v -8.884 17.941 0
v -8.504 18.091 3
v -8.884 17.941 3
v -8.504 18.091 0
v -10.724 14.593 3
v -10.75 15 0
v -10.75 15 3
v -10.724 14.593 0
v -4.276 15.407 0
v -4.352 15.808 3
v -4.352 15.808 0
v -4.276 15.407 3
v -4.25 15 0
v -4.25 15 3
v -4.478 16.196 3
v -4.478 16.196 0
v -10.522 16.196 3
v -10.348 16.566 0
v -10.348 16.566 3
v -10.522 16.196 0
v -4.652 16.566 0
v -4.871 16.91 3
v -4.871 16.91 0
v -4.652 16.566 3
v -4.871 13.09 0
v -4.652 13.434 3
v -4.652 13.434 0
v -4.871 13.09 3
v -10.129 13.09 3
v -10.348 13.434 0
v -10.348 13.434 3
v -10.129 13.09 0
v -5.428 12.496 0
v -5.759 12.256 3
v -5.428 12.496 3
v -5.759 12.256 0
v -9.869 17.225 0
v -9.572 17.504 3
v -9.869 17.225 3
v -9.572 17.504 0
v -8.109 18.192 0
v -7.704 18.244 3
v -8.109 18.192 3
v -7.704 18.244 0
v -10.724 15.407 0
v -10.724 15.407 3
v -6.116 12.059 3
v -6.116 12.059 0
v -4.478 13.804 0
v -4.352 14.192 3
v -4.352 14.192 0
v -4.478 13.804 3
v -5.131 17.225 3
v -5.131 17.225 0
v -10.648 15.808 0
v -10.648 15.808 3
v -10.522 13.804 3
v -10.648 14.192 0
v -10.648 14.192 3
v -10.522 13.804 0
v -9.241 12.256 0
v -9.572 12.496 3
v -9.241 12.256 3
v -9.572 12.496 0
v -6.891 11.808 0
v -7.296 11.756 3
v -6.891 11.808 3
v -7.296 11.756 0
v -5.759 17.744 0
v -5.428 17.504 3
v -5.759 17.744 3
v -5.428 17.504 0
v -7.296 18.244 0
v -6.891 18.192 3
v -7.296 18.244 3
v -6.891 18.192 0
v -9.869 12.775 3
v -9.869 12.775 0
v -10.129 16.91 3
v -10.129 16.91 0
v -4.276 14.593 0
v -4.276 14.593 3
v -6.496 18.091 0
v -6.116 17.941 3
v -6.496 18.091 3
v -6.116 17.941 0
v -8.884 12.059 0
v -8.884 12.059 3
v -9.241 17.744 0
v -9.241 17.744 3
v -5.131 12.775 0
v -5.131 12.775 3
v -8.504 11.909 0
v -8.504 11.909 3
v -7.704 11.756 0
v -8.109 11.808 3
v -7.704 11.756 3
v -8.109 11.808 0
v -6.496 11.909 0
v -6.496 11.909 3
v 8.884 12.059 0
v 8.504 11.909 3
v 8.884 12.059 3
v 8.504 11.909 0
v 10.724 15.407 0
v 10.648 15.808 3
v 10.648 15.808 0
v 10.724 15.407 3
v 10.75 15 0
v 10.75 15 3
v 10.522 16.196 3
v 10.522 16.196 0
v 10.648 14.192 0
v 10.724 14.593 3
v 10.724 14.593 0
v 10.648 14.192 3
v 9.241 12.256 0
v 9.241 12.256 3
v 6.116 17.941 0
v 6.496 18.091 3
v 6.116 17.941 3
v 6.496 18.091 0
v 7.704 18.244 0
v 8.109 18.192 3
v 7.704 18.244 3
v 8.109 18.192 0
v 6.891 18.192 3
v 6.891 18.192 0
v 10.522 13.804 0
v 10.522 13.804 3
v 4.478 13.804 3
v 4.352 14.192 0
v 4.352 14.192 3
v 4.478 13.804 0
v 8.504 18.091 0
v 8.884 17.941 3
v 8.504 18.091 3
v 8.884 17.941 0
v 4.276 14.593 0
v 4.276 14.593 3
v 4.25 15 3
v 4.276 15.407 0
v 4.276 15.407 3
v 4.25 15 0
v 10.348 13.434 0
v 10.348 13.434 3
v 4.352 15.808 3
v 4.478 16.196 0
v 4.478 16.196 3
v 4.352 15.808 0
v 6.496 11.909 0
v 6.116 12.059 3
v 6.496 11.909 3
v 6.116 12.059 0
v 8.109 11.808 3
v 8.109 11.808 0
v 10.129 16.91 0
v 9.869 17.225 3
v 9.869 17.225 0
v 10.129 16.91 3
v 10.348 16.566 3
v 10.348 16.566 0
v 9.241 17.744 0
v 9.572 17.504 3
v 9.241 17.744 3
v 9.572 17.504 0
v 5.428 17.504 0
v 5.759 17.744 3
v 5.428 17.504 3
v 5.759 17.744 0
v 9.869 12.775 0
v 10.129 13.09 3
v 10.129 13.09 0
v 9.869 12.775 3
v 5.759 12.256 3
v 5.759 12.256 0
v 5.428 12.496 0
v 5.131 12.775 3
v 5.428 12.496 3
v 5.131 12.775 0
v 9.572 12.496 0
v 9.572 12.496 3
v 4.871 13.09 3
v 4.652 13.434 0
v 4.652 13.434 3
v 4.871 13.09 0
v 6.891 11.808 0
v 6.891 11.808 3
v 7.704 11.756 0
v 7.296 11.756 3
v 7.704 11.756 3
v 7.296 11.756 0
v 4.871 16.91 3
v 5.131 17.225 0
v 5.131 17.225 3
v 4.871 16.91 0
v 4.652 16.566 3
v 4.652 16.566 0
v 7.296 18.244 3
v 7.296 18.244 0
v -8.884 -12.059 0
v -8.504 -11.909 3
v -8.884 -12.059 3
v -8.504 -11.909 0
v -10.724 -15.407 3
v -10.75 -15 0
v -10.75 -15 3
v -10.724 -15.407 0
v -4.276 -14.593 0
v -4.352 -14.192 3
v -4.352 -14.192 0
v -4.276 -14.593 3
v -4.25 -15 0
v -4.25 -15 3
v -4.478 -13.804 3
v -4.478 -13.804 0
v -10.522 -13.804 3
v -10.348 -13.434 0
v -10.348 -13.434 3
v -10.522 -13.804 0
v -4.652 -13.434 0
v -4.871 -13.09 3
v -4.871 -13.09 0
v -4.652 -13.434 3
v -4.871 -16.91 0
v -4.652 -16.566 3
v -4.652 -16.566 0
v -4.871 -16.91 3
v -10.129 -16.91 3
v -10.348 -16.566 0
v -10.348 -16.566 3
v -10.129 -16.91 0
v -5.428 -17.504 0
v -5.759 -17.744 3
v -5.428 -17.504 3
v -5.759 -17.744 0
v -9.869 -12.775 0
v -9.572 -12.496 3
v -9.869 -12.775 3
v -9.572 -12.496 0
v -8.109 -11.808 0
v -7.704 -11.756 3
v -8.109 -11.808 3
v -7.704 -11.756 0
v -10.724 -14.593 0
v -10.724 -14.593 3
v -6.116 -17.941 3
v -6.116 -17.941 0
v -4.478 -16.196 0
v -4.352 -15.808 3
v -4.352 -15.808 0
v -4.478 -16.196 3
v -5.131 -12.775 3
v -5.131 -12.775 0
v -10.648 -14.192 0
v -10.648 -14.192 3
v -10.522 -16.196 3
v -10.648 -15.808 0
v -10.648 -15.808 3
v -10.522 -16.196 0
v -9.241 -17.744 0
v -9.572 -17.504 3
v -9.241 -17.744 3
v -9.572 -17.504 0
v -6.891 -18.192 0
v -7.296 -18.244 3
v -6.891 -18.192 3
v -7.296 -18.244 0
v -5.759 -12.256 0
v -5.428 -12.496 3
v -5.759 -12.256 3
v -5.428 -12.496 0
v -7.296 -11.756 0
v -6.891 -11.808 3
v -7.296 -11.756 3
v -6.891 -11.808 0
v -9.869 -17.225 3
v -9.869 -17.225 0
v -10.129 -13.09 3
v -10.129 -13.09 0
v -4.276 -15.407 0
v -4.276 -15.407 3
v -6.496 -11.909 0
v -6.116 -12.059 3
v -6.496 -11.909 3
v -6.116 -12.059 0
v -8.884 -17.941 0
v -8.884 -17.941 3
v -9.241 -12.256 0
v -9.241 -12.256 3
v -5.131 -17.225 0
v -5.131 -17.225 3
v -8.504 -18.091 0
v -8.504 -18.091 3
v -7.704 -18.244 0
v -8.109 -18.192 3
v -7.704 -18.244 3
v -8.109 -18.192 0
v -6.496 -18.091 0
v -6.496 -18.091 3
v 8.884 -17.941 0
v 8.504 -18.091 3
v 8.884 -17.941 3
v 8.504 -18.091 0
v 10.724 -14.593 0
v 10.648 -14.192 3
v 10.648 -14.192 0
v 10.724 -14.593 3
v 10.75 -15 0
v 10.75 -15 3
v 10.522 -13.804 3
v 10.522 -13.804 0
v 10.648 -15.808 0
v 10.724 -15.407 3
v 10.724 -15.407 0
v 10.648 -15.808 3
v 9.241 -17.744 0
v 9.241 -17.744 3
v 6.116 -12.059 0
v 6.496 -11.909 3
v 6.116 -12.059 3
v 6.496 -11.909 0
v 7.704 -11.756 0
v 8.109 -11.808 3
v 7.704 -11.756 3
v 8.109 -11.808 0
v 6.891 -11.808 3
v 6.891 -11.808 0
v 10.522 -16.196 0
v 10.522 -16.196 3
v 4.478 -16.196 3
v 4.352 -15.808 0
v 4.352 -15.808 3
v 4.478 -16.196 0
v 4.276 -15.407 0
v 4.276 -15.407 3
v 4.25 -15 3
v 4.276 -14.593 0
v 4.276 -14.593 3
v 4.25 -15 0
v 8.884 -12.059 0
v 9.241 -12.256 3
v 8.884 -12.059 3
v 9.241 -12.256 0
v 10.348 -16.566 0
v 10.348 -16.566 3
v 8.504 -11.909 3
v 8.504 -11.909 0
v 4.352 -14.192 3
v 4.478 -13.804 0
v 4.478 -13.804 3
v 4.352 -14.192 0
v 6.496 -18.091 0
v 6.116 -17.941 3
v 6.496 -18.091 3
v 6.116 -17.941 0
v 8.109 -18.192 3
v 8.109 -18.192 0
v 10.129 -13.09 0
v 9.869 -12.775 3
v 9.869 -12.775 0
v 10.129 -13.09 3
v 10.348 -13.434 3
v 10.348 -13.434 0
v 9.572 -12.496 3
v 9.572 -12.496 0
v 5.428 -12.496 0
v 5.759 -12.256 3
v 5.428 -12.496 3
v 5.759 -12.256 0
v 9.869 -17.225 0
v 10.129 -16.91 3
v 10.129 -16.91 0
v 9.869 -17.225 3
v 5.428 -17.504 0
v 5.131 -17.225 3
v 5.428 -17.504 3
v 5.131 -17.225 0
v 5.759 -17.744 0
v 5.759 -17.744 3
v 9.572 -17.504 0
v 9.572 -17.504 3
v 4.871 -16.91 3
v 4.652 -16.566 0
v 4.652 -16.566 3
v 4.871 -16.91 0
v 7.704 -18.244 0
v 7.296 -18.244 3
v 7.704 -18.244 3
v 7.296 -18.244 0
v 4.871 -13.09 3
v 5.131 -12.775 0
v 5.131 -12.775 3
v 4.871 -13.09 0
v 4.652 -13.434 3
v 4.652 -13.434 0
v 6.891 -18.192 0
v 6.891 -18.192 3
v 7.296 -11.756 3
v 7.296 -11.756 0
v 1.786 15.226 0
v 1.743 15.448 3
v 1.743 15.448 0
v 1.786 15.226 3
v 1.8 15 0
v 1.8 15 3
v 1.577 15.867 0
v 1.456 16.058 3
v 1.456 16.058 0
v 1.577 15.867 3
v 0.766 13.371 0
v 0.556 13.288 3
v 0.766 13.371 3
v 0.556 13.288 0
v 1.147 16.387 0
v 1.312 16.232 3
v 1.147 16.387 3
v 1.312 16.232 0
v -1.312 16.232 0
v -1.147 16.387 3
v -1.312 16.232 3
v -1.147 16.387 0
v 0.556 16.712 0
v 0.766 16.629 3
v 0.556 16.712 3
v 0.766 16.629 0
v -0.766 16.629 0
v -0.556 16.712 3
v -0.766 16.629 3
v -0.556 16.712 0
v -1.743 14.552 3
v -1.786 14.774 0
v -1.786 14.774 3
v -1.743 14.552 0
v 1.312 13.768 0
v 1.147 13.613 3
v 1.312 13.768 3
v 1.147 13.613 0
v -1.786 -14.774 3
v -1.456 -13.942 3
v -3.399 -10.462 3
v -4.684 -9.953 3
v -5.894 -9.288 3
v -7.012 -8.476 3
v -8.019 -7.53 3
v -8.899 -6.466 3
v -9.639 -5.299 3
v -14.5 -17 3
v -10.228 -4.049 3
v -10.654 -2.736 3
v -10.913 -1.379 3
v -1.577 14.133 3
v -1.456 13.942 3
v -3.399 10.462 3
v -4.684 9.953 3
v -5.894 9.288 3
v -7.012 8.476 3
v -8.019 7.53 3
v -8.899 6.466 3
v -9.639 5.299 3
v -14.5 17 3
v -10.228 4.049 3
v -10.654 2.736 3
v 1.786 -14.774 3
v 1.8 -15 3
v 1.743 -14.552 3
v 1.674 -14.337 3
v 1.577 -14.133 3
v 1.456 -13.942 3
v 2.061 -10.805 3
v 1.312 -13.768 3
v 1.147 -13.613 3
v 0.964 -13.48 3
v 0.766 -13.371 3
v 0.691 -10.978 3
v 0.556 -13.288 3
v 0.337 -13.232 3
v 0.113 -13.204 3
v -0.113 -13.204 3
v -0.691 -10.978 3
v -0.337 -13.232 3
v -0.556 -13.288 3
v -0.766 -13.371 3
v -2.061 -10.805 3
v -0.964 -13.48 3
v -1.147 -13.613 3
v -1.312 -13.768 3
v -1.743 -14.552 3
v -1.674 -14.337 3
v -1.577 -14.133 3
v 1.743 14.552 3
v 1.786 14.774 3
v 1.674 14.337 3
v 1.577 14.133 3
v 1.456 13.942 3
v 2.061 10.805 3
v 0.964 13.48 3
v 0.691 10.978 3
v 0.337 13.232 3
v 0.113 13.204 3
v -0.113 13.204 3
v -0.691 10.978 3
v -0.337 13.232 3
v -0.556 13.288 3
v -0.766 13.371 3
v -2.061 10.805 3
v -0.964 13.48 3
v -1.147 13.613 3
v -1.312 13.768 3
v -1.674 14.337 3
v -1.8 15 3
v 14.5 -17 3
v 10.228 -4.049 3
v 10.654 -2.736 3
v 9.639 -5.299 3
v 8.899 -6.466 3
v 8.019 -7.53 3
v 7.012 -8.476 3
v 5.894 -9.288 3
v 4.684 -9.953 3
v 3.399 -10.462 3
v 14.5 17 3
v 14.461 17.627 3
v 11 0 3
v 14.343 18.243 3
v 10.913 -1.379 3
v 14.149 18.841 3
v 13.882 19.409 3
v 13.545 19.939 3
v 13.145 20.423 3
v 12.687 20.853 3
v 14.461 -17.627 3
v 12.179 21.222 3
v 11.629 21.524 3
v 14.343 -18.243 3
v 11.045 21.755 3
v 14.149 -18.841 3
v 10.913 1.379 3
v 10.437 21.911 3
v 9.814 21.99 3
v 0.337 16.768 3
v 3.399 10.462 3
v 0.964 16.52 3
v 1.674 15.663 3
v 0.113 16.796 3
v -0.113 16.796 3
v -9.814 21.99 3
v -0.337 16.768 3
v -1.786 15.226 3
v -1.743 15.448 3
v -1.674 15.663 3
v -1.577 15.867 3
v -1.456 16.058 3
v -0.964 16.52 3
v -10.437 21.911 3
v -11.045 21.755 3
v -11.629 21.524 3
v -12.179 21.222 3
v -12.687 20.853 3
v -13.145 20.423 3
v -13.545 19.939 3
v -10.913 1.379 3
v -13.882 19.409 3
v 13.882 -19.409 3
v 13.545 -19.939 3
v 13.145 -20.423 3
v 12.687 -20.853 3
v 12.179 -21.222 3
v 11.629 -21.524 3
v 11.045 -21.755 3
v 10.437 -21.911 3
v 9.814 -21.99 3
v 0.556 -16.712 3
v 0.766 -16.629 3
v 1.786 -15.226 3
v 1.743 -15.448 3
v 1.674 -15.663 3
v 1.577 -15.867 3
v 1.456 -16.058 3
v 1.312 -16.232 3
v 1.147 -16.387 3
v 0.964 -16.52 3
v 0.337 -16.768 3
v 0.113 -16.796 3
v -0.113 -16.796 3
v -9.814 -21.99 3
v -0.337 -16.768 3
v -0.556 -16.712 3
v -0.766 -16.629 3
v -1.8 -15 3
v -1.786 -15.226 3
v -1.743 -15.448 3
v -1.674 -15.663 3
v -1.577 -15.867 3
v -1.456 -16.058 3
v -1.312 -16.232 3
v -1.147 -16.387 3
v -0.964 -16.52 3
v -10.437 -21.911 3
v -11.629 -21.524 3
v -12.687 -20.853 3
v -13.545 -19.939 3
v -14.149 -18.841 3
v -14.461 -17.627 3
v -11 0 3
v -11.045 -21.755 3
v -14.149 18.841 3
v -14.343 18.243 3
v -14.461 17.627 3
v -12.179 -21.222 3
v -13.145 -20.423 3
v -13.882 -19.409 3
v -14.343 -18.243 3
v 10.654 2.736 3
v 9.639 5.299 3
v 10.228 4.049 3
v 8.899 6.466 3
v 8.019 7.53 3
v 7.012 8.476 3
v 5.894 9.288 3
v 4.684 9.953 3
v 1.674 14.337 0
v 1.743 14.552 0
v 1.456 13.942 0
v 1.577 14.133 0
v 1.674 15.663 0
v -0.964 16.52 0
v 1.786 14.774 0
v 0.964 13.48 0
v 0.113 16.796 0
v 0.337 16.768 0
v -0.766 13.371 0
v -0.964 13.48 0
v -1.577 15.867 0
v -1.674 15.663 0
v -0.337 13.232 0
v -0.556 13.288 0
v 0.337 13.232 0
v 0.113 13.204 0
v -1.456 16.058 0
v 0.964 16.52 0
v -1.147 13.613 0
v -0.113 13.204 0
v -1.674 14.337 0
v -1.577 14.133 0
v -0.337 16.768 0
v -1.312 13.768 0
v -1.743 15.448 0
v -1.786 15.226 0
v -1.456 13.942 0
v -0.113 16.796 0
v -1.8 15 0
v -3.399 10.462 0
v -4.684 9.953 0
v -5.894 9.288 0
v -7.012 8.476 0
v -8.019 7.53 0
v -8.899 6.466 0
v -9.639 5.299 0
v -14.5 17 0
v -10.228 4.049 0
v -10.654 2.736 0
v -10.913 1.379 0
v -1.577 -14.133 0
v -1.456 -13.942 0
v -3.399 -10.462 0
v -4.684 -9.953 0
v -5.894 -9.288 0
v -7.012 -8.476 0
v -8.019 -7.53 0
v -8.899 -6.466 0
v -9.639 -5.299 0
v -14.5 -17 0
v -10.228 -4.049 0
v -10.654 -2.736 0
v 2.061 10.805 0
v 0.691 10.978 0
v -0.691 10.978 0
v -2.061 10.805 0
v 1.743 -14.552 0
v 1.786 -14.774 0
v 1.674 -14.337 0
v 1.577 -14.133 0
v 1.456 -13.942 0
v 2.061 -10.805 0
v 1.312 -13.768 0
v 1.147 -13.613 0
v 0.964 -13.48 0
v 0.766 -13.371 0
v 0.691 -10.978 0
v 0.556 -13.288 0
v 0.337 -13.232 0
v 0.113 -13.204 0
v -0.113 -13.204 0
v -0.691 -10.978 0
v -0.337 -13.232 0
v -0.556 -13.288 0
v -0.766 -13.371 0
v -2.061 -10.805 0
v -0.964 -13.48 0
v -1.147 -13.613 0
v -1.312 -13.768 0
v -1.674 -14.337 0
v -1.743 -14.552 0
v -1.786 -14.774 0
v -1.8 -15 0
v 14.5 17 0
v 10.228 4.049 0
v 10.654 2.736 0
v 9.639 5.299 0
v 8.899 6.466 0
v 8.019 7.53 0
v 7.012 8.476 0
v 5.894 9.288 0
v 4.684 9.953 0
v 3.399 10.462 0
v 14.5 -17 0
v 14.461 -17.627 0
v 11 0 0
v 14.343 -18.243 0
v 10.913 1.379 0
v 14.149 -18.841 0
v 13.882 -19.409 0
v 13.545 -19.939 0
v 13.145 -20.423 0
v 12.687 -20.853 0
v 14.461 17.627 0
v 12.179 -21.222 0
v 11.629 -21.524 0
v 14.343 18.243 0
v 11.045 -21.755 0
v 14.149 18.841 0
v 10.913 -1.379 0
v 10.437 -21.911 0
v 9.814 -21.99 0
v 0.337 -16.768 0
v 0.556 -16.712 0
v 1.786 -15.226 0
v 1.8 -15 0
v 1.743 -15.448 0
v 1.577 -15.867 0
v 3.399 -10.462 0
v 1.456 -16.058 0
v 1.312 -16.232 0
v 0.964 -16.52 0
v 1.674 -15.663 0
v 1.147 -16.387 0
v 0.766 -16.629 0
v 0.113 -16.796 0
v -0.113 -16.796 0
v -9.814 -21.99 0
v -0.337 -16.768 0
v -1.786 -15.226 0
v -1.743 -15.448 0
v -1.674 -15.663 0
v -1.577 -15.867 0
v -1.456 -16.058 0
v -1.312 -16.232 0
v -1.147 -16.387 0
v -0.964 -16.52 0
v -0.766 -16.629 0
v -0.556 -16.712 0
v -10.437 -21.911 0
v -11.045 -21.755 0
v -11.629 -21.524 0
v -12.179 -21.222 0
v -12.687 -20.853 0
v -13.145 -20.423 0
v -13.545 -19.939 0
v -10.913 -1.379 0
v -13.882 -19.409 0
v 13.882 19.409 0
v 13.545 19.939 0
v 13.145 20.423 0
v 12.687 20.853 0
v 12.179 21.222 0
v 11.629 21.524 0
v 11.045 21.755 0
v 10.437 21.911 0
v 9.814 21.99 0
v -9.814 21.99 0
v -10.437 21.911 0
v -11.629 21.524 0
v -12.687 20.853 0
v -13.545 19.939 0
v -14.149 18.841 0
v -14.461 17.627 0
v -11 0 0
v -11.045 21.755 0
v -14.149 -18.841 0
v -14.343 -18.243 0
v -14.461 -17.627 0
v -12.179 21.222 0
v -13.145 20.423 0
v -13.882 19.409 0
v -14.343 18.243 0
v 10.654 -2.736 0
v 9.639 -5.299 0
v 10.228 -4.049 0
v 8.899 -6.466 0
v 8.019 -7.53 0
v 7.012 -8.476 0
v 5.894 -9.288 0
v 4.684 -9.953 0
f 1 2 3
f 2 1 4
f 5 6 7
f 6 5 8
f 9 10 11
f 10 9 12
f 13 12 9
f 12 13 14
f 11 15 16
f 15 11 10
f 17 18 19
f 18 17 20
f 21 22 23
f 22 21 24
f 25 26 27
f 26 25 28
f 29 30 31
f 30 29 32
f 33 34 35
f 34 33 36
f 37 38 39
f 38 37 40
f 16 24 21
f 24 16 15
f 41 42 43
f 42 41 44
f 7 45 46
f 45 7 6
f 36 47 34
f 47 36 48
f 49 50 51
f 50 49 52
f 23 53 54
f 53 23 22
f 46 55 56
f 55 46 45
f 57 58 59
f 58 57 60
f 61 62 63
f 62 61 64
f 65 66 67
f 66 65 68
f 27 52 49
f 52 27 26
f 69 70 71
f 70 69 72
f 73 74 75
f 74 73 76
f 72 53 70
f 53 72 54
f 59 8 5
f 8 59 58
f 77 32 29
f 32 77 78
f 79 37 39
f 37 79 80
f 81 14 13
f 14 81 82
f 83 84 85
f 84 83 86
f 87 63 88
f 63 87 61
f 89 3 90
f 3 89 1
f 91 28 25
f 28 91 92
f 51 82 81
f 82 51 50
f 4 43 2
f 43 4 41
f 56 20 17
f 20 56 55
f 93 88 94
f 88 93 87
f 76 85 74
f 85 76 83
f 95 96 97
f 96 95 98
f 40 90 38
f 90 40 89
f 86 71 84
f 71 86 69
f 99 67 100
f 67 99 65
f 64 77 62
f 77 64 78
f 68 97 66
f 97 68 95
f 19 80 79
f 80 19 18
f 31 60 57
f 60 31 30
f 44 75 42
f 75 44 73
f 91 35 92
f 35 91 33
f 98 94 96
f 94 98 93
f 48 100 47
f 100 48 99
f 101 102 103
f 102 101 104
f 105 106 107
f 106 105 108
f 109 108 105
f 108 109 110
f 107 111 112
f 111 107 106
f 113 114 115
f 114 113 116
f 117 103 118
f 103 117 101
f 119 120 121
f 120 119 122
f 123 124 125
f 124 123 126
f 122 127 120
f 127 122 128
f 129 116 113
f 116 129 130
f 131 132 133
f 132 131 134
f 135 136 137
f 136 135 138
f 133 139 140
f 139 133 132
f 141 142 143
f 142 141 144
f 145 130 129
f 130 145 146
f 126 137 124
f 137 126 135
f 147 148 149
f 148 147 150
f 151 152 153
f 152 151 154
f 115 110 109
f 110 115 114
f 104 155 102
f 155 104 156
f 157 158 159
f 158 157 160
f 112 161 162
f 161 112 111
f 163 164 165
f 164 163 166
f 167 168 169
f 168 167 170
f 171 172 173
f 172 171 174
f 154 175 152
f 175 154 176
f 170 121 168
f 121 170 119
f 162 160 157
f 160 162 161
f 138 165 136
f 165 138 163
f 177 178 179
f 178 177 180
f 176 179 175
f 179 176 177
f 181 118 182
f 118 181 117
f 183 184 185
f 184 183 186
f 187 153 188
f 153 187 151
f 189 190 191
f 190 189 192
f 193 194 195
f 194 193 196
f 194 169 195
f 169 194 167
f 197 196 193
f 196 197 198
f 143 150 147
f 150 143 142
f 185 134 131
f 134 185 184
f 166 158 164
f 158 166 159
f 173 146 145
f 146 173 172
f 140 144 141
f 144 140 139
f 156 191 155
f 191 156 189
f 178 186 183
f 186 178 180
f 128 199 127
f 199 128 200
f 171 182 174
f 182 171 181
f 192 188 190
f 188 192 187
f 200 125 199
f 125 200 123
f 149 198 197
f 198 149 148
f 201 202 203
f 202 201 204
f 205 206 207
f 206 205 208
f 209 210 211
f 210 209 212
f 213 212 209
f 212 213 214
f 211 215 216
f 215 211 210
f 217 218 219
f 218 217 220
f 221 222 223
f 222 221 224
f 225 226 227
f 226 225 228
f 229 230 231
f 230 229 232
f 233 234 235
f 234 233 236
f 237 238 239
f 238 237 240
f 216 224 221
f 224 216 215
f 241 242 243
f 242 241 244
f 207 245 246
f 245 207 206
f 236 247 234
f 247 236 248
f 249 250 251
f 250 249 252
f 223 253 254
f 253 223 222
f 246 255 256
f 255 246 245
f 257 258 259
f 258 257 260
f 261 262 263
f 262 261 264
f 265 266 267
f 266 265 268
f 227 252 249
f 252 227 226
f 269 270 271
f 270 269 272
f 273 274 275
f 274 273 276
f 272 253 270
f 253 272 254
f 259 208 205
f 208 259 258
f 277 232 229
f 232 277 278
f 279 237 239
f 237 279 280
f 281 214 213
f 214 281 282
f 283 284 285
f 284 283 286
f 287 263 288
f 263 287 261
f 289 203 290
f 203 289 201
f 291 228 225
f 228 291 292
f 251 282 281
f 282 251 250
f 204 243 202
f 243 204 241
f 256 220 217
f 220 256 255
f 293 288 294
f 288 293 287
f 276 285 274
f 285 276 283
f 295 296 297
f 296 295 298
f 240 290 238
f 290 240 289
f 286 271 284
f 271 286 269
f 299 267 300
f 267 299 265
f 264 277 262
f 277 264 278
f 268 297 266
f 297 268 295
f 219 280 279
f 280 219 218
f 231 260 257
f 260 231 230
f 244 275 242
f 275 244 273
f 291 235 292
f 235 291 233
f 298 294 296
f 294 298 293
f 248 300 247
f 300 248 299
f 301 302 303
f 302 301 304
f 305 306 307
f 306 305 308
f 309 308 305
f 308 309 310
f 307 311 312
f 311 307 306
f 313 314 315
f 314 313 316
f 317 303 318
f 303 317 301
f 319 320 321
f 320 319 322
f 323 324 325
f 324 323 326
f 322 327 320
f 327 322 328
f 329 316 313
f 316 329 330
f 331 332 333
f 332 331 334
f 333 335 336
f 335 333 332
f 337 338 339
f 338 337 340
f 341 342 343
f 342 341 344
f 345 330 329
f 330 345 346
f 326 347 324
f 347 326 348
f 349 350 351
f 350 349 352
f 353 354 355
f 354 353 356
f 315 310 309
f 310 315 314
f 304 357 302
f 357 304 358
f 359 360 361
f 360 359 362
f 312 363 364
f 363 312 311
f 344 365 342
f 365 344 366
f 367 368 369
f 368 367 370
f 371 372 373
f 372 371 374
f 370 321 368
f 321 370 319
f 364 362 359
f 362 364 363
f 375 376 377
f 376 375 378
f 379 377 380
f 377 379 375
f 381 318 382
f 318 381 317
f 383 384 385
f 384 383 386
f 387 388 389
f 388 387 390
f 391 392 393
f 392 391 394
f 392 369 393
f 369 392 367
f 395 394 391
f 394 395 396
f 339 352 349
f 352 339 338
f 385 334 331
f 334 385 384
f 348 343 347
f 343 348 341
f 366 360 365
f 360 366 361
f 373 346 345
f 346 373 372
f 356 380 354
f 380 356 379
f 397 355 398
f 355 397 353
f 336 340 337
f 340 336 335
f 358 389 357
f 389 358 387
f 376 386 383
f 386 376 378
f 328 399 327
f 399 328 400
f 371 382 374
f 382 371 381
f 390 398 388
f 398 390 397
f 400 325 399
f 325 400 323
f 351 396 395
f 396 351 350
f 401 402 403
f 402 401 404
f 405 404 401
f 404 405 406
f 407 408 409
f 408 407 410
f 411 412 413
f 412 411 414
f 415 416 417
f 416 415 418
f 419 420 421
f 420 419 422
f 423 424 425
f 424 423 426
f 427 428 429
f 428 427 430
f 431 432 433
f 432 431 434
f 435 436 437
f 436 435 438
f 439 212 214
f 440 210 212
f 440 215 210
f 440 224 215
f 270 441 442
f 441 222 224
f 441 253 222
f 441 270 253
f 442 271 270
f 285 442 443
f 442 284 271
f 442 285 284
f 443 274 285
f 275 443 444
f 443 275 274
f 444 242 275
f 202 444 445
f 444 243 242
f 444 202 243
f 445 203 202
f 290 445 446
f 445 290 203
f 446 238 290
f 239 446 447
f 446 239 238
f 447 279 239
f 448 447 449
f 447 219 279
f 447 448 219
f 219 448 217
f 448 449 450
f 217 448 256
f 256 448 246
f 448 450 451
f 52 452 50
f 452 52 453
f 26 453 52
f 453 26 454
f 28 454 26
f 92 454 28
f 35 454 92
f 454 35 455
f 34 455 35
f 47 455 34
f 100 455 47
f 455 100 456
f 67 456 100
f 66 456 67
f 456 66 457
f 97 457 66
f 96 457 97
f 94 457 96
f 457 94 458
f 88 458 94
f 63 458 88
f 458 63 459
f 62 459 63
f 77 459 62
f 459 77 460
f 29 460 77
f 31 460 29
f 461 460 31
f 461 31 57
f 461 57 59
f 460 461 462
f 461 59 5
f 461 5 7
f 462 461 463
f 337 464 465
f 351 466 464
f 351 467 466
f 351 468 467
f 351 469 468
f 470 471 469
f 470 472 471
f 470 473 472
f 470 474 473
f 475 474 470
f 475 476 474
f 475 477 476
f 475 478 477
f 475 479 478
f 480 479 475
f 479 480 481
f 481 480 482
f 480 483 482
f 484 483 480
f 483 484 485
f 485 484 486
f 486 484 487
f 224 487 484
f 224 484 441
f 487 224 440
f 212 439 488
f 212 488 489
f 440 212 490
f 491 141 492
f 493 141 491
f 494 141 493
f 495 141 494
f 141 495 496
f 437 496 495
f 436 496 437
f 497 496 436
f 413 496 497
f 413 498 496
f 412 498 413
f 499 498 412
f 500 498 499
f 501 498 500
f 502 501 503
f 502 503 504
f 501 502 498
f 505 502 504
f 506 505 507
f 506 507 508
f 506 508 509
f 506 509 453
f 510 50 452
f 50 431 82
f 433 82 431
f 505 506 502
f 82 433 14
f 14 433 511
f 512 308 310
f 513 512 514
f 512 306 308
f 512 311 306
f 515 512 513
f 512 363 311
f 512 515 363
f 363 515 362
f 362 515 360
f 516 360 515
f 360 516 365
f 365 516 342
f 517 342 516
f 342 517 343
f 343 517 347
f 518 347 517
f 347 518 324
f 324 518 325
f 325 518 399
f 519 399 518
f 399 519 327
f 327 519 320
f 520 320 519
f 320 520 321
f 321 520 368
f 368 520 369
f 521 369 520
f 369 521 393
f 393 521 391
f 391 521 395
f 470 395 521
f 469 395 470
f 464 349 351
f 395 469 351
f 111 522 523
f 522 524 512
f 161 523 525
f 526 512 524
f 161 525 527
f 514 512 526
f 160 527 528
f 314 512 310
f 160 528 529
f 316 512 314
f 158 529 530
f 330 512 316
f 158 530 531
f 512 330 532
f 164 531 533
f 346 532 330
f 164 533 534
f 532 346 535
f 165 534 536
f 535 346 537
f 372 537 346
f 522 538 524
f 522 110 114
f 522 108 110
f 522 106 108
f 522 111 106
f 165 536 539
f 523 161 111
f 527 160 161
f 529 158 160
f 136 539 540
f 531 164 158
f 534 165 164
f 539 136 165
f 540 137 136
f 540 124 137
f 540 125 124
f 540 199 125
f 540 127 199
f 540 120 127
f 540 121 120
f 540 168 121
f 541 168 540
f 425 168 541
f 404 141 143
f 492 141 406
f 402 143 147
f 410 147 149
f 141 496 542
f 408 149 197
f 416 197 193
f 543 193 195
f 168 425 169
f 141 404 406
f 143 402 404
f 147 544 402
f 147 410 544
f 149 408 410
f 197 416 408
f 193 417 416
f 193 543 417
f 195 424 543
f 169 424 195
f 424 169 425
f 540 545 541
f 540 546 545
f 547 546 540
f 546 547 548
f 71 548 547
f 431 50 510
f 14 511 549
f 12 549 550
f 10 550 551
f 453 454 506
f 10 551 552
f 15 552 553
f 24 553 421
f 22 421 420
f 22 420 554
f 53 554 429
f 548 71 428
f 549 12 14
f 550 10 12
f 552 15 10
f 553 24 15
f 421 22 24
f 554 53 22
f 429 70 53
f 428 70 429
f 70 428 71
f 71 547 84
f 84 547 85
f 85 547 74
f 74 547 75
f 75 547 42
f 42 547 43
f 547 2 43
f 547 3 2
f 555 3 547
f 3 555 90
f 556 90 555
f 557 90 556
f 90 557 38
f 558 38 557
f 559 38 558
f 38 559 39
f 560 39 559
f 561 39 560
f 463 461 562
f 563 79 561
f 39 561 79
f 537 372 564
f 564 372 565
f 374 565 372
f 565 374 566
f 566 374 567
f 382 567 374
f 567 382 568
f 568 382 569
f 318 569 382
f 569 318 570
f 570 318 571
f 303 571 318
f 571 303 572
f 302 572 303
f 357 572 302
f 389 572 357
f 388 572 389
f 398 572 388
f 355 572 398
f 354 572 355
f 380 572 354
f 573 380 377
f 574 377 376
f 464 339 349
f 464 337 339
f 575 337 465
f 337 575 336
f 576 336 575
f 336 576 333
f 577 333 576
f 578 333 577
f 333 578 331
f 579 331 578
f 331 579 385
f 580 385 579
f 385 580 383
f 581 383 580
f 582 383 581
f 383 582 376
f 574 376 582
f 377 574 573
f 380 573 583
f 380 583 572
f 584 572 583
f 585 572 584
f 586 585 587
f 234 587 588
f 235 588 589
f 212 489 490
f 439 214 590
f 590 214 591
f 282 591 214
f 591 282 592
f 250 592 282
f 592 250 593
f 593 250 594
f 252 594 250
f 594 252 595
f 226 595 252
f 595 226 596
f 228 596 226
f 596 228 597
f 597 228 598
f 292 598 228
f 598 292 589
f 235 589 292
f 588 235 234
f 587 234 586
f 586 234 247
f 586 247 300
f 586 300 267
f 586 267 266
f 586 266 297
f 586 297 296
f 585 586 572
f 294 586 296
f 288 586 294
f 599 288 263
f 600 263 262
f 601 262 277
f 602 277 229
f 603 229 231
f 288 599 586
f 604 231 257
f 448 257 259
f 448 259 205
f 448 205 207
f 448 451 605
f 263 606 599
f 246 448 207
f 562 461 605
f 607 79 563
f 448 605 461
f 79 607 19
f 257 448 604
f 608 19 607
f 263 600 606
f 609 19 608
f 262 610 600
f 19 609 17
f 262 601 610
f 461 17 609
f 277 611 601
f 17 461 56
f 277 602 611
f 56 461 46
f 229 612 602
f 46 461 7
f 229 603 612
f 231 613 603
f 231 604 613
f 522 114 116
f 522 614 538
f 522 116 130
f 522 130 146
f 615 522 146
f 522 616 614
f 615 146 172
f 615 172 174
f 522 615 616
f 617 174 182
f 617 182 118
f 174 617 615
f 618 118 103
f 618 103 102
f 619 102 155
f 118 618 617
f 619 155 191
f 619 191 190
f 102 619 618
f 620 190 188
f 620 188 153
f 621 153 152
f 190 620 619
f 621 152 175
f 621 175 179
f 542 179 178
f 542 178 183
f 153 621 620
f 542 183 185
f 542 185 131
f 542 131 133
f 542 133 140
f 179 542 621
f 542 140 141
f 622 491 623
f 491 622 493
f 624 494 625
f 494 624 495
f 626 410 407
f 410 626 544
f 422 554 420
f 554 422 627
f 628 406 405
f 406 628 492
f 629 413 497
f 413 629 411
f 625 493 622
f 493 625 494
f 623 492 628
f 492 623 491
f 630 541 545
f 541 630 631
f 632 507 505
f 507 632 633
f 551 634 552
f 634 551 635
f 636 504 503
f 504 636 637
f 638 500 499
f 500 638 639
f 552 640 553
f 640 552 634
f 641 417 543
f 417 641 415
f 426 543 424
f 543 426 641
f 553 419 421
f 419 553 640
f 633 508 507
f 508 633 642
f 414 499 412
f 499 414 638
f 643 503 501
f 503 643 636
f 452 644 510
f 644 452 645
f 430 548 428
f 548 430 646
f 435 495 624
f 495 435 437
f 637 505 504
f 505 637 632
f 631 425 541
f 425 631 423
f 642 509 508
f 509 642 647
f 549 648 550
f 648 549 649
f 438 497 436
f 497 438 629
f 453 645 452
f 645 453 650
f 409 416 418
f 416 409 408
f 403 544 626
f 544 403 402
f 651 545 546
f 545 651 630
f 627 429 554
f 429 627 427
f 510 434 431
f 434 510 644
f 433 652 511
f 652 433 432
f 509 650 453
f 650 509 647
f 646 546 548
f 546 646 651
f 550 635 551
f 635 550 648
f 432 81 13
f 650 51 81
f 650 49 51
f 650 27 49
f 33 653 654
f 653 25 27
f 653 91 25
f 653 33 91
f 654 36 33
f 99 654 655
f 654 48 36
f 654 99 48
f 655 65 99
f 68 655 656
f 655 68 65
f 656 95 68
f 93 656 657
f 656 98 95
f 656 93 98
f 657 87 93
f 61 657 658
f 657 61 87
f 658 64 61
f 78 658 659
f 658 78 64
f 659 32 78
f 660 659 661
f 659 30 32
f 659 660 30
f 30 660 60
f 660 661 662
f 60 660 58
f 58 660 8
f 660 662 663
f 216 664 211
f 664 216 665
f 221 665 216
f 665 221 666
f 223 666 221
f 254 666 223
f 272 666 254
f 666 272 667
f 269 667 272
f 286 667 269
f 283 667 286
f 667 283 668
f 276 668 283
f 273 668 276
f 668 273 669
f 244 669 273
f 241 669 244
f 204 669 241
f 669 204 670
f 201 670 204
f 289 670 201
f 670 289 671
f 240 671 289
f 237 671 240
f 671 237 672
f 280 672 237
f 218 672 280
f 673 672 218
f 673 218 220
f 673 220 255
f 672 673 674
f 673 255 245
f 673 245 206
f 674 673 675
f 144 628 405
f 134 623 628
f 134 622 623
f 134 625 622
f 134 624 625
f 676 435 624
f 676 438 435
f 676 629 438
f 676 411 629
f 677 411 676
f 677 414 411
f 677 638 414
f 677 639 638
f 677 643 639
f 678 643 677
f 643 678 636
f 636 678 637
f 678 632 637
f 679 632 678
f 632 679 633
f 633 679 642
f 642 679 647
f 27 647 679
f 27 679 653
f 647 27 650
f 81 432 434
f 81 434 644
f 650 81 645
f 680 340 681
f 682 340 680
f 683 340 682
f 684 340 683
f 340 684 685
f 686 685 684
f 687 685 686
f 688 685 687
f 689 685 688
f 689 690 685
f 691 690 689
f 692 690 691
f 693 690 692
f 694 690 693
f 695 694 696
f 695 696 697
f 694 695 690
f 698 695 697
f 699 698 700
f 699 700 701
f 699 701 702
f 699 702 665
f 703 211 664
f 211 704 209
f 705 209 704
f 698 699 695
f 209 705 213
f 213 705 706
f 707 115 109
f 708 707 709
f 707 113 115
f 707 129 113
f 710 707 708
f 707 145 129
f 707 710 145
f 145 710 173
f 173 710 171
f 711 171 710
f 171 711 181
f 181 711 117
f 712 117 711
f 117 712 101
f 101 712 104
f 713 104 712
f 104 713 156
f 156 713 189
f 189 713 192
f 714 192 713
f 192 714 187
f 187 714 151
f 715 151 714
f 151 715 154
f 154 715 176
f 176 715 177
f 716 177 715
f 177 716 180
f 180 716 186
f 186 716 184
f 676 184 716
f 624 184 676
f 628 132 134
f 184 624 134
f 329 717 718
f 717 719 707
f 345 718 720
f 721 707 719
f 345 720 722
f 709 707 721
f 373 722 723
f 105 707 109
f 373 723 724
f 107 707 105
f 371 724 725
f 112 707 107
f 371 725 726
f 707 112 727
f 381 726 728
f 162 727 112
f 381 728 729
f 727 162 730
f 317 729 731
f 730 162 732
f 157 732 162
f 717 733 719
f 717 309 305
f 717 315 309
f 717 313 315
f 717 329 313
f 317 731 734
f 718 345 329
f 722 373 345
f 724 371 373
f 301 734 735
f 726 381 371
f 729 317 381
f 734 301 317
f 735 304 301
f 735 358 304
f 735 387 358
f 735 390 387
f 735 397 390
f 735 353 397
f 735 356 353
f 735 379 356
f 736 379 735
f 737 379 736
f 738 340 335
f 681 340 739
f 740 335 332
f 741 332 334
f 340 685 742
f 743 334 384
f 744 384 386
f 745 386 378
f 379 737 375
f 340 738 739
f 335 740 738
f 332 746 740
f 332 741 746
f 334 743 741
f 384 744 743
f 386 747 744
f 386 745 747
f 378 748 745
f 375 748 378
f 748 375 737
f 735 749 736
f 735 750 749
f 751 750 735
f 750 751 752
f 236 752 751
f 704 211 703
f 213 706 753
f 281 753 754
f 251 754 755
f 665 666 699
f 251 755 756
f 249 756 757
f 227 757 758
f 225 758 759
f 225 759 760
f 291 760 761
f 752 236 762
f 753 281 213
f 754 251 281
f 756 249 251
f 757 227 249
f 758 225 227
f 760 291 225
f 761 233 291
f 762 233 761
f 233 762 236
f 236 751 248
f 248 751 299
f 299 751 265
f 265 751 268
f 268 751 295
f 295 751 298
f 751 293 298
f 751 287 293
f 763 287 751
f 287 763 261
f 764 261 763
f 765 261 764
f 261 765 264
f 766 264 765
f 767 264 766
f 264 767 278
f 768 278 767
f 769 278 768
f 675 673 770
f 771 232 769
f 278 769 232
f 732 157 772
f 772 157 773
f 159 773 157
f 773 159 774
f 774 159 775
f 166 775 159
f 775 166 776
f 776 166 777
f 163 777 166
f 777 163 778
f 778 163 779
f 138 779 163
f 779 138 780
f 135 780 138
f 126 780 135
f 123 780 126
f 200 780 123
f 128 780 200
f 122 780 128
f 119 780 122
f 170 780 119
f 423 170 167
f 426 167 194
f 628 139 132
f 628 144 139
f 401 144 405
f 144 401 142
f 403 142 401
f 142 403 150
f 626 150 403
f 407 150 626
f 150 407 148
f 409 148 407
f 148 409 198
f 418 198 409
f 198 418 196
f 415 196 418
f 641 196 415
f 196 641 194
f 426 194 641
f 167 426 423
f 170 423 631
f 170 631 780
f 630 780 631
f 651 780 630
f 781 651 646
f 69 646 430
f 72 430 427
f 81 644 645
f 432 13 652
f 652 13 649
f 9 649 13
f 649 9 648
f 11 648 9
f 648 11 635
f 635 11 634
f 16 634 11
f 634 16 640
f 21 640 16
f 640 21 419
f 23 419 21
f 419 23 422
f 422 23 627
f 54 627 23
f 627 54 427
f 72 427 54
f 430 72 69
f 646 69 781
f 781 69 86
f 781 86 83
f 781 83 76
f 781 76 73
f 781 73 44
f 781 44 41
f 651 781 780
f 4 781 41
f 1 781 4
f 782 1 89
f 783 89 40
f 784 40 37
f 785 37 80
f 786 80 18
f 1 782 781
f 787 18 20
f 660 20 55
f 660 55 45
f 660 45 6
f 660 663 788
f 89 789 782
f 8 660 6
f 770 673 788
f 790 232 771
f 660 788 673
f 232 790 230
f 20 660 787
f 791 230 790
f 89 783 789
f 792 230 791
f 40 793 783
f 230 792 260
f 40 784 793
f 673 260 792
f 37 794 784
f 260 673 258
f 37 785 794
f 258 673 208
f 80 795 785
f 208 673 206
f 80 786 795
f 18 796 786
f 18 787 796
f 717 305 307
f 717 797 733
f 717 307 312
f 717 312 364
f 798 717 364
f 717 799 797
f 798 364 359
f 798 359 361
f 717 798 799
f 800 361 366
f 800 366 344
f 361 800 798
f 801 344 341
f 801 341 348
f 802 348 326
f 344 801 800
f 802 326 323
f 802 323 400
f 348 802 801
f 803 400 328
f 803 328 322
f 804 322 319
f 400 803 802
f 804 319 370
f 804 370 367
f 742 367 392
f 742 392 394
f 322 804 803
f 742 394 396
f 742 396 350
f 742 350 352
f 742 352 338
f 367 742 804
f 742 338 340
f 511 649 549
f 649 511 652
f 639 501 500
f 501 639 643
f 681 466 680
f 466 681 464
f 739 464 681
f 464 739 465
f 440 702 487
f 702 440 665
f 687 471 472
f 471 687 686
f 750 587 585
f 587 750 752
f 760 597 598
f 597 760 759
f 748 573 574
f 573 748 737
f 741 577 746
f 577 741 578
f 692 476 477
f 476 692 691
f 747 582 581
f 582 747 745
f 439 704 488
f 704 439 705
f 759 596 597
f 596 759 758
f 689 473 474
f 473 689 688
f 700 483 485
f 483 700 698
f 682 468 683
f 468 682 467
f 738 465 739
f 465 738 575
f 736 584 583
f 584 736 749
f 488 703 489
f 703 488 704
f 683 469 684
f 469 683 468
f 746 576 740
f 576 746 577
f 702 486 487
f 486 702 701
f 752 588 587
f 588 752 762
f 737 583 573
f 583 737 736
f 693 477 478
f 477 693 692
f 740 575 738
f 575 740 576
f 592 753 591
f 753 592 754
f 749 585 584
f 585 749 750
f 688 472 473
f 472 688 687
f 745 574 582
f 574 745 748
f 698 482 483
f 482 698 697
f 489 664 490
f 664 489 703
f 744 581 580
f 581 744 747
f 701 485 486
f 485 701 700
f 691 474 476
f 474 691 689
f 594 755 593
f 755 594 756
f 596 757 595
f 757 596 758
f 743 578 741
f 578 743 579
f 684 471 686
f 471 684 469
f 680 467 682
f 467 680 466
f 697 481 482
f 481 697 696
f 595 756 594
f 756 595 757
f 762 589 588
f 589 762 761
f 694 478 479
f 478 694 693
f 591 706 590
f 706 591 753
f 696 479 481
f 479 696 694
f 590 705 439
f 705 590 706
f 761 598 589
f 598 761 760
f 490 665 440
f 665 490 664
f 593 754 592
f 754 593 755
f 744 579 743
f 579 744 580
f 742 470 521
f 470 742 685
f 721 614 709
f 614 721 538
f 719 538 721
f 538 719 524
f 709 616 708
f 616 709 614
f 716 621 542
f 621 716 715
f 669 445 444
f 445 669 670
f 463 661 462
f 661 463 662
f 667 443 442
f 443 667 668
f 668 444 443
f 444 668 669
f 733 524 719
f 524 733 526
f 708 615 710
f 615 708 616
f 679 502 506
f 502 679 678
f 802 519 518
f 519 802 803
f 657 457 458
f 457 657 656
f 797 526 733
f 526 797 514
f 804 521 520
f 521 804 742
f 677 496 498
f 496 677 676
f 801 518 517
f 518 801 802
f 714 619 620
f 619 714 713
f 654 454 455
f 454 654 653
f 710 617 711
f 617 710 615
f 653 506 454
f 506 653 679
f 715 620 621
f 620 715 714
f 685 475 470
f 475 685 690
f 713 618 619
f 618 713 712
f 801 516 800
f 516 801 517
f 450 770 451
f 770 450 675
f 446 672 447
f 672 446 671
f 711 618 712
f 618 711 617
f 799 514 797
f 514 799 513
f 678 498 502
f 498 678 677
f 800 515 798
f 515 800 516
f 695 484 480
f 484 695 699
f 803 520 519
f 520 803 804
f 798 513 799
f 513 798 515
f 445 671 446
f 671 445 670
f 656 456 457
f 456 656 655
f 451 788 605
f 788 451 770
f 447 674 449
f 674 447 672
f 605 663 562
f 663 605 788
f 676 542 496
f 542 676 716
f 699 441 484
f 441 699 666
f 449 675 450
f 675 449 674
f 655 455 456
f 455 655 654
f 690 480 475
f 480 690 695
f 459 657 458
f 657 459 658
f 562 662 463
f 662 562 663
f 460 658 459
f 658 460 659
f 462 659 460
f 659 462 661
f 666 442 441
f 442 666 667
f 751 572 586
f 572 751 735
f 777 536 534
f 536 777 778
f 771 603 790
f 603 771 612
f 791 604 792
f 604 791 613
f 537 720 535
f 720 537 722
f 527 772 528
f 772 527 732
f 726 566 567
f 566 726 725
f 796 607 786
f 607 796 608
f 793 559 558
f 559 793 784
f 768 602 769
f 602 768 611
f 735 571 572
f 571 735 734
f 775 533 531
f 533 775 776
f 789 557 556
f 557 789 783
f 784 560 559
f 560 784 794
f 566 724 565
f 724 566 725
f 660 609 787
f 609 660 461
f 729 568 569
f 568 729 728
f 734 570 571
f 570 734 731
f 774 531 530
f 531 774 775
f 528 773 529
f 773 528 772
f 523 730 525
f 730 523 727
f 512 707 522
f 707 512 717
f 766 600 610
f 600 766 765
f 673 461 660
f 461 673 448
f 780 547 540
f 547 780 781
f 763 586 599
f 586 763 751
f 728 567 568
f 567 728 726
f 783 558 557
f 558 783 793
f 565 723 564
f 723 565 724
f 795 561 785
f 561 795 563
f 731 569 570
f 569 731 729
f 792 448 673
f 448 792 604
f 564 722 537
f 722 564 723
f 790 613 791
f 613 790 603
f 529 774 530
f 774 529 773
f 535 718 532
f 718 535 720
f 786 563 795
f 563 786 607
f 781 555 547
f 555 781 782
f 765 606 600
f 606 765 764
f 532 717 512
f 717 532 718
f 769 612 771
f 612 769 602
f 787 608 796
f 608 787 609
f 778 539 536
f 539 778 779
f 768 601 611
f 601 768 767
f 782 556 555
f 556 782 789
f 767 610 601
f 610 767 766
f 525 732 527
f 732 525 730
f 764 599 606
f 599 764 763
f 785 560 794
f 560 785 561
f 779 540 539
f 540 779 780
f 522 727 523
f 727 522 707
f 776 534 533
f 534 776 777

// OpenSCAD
$fn = 50;


difference() {
	union() {
		hull() {
			translate(v = [-9.5000000000, 17.0000000000, 0]) {
				cylinder(h = 3, r = 5);
			}
			translate(v = [9.5000000000, 17.0000000000, 0]) {
				cylinder(h = 3, r = 5);
			}
			translate(v = [-9.5000000000, -17.0000000000, 0]) {
				cylinder(h = 3, r = 5);
			}
			translate(v = [9.5000000000, -17.0000000000, 0]) {
				cylinder(h = 3, r = 5);
			}
		}
	}
	union() {
		#translate(v = [-7.5000000000, 15.0000000000, 0]) {
			cylinder(h = 3, r = 3.2500000000);
		}
		#translate(v = [7.5000000000, 15.0000000000, 0]) {
			cylinder(h = 3, r = 3.2500000000);
		}
		#translate(v = [-7.5000000000, -15.0000000000, 0]) {
			cylinder(h = 3, r = 3.2500000000);
		}
		#translate(v = [7.5000000000, -15.0000000000, 0]) {
			cylinder(h = 3, r = 3.2500000000);
		}
		#translate(v = [-7.5000000000, -15.0000000000, -100.0000000000]) {
			cylinder(h = 200, r = 3.2500000000);
		}
		#translate(v = [-7.5000000000, 15.0000000000, -100.0000000000]) {
			cylinder(h = 200, r = 3.2500000000);
		}
		#translate(v = [7.5000000000, -15.0000000000, -100.0000000000]) {
			cylinder(h = 200, r = 3.2500000000);
		}
		#translate(v = [7.5000000000, 15.0000000000, -100.0000000000]) {
			cylinder(h = 200, r = 3.2500000000);
		}
		#translate(v = [-7.5000000000, 15.0000000000, 0]) {
			cylinder(h = 3, r = 1.8000000000);
		}
		#translate(v = [0.0000000000, 15.0000000000, 0]) {
			cylinder(h = 3, r = 1.8000000000);
		}
		#translate(v = [7.5000000000, 15.0000000000, 0]) {
			cylinder(h = 3, r = 1.8000000000);
		}
		#translate(v = [-7.5000000000, -15.0000000000, 0]) {
			cylinder(h = 3, r = 1.8000000000);
		}
		#translate(v = [0.0000000000, -15.0000000000, 0]) {
			cylinder(h = 3, r = 1.8000000000);
		}
		#translate(v = [7.5000000000, -15.0000000000, 0]) {
			cylinder(h = 3, r = 1.8000000000);
		}
		#translate(v = [-7.5000000000, 15.0000000000, 0]) {
			cylinder(h = 3, r = 1.8000000000);
		}
		#translate(v = [0.0000000000, 15.0000000000, 0]) {
			cylinder(h = 3, r = 1.8000000000);
		}
		#translate(v = [7.5000000000, 15.0000000000, 0]) {
			cylinder(h = 3, r = 1.8000000000);
		}
		#translate(v = [-7.5000000000, -15.0000000000, 0]) {
			cylinder(h = 3, r = 1.8000000000);
		}
		#translate(v = [0.0000000000, -15.0000000000, 0]) {
			cylinder(h = 3, r = 1.8000000000);
		}
		#translate(v = [7.5000000000, -15.0000000000, 0]) {
			cylinder(h = 3, r = 1.8000000000);
		}
		#translate(v = [-7.5000000000, 15.0000000000, 0]) {
			cylinder(h = 3, r = 1.8000000000);
		}
		#translate(v = [0.0000000000, 15.0000000000, 0]) {
			cylinder(h = 3, r = 1.8000000000);
		}
		#translate(v = [7.5000000000, 15.0000000000, 0]) {
			cylinder(h = 3, r = 1.8000000000);
		}
		#translate(v = [-7.5000000000, -15.0000000000, 0]) {
			cylinder(h = 3, r = 1.8000000000);
		}
		#translate(v = [0.0000000000, -15.0000000000, 0]) {
			cylinder(h = 3, r = 1.8000000000);
		}
		#translate(v = [7.5000000000, -15.0000000000, 0]) {
			cylinder(h = 3, r = 1.8000000000);
		}
		#cylinder(h = 3, r = 11.0000000000);
	}
}
